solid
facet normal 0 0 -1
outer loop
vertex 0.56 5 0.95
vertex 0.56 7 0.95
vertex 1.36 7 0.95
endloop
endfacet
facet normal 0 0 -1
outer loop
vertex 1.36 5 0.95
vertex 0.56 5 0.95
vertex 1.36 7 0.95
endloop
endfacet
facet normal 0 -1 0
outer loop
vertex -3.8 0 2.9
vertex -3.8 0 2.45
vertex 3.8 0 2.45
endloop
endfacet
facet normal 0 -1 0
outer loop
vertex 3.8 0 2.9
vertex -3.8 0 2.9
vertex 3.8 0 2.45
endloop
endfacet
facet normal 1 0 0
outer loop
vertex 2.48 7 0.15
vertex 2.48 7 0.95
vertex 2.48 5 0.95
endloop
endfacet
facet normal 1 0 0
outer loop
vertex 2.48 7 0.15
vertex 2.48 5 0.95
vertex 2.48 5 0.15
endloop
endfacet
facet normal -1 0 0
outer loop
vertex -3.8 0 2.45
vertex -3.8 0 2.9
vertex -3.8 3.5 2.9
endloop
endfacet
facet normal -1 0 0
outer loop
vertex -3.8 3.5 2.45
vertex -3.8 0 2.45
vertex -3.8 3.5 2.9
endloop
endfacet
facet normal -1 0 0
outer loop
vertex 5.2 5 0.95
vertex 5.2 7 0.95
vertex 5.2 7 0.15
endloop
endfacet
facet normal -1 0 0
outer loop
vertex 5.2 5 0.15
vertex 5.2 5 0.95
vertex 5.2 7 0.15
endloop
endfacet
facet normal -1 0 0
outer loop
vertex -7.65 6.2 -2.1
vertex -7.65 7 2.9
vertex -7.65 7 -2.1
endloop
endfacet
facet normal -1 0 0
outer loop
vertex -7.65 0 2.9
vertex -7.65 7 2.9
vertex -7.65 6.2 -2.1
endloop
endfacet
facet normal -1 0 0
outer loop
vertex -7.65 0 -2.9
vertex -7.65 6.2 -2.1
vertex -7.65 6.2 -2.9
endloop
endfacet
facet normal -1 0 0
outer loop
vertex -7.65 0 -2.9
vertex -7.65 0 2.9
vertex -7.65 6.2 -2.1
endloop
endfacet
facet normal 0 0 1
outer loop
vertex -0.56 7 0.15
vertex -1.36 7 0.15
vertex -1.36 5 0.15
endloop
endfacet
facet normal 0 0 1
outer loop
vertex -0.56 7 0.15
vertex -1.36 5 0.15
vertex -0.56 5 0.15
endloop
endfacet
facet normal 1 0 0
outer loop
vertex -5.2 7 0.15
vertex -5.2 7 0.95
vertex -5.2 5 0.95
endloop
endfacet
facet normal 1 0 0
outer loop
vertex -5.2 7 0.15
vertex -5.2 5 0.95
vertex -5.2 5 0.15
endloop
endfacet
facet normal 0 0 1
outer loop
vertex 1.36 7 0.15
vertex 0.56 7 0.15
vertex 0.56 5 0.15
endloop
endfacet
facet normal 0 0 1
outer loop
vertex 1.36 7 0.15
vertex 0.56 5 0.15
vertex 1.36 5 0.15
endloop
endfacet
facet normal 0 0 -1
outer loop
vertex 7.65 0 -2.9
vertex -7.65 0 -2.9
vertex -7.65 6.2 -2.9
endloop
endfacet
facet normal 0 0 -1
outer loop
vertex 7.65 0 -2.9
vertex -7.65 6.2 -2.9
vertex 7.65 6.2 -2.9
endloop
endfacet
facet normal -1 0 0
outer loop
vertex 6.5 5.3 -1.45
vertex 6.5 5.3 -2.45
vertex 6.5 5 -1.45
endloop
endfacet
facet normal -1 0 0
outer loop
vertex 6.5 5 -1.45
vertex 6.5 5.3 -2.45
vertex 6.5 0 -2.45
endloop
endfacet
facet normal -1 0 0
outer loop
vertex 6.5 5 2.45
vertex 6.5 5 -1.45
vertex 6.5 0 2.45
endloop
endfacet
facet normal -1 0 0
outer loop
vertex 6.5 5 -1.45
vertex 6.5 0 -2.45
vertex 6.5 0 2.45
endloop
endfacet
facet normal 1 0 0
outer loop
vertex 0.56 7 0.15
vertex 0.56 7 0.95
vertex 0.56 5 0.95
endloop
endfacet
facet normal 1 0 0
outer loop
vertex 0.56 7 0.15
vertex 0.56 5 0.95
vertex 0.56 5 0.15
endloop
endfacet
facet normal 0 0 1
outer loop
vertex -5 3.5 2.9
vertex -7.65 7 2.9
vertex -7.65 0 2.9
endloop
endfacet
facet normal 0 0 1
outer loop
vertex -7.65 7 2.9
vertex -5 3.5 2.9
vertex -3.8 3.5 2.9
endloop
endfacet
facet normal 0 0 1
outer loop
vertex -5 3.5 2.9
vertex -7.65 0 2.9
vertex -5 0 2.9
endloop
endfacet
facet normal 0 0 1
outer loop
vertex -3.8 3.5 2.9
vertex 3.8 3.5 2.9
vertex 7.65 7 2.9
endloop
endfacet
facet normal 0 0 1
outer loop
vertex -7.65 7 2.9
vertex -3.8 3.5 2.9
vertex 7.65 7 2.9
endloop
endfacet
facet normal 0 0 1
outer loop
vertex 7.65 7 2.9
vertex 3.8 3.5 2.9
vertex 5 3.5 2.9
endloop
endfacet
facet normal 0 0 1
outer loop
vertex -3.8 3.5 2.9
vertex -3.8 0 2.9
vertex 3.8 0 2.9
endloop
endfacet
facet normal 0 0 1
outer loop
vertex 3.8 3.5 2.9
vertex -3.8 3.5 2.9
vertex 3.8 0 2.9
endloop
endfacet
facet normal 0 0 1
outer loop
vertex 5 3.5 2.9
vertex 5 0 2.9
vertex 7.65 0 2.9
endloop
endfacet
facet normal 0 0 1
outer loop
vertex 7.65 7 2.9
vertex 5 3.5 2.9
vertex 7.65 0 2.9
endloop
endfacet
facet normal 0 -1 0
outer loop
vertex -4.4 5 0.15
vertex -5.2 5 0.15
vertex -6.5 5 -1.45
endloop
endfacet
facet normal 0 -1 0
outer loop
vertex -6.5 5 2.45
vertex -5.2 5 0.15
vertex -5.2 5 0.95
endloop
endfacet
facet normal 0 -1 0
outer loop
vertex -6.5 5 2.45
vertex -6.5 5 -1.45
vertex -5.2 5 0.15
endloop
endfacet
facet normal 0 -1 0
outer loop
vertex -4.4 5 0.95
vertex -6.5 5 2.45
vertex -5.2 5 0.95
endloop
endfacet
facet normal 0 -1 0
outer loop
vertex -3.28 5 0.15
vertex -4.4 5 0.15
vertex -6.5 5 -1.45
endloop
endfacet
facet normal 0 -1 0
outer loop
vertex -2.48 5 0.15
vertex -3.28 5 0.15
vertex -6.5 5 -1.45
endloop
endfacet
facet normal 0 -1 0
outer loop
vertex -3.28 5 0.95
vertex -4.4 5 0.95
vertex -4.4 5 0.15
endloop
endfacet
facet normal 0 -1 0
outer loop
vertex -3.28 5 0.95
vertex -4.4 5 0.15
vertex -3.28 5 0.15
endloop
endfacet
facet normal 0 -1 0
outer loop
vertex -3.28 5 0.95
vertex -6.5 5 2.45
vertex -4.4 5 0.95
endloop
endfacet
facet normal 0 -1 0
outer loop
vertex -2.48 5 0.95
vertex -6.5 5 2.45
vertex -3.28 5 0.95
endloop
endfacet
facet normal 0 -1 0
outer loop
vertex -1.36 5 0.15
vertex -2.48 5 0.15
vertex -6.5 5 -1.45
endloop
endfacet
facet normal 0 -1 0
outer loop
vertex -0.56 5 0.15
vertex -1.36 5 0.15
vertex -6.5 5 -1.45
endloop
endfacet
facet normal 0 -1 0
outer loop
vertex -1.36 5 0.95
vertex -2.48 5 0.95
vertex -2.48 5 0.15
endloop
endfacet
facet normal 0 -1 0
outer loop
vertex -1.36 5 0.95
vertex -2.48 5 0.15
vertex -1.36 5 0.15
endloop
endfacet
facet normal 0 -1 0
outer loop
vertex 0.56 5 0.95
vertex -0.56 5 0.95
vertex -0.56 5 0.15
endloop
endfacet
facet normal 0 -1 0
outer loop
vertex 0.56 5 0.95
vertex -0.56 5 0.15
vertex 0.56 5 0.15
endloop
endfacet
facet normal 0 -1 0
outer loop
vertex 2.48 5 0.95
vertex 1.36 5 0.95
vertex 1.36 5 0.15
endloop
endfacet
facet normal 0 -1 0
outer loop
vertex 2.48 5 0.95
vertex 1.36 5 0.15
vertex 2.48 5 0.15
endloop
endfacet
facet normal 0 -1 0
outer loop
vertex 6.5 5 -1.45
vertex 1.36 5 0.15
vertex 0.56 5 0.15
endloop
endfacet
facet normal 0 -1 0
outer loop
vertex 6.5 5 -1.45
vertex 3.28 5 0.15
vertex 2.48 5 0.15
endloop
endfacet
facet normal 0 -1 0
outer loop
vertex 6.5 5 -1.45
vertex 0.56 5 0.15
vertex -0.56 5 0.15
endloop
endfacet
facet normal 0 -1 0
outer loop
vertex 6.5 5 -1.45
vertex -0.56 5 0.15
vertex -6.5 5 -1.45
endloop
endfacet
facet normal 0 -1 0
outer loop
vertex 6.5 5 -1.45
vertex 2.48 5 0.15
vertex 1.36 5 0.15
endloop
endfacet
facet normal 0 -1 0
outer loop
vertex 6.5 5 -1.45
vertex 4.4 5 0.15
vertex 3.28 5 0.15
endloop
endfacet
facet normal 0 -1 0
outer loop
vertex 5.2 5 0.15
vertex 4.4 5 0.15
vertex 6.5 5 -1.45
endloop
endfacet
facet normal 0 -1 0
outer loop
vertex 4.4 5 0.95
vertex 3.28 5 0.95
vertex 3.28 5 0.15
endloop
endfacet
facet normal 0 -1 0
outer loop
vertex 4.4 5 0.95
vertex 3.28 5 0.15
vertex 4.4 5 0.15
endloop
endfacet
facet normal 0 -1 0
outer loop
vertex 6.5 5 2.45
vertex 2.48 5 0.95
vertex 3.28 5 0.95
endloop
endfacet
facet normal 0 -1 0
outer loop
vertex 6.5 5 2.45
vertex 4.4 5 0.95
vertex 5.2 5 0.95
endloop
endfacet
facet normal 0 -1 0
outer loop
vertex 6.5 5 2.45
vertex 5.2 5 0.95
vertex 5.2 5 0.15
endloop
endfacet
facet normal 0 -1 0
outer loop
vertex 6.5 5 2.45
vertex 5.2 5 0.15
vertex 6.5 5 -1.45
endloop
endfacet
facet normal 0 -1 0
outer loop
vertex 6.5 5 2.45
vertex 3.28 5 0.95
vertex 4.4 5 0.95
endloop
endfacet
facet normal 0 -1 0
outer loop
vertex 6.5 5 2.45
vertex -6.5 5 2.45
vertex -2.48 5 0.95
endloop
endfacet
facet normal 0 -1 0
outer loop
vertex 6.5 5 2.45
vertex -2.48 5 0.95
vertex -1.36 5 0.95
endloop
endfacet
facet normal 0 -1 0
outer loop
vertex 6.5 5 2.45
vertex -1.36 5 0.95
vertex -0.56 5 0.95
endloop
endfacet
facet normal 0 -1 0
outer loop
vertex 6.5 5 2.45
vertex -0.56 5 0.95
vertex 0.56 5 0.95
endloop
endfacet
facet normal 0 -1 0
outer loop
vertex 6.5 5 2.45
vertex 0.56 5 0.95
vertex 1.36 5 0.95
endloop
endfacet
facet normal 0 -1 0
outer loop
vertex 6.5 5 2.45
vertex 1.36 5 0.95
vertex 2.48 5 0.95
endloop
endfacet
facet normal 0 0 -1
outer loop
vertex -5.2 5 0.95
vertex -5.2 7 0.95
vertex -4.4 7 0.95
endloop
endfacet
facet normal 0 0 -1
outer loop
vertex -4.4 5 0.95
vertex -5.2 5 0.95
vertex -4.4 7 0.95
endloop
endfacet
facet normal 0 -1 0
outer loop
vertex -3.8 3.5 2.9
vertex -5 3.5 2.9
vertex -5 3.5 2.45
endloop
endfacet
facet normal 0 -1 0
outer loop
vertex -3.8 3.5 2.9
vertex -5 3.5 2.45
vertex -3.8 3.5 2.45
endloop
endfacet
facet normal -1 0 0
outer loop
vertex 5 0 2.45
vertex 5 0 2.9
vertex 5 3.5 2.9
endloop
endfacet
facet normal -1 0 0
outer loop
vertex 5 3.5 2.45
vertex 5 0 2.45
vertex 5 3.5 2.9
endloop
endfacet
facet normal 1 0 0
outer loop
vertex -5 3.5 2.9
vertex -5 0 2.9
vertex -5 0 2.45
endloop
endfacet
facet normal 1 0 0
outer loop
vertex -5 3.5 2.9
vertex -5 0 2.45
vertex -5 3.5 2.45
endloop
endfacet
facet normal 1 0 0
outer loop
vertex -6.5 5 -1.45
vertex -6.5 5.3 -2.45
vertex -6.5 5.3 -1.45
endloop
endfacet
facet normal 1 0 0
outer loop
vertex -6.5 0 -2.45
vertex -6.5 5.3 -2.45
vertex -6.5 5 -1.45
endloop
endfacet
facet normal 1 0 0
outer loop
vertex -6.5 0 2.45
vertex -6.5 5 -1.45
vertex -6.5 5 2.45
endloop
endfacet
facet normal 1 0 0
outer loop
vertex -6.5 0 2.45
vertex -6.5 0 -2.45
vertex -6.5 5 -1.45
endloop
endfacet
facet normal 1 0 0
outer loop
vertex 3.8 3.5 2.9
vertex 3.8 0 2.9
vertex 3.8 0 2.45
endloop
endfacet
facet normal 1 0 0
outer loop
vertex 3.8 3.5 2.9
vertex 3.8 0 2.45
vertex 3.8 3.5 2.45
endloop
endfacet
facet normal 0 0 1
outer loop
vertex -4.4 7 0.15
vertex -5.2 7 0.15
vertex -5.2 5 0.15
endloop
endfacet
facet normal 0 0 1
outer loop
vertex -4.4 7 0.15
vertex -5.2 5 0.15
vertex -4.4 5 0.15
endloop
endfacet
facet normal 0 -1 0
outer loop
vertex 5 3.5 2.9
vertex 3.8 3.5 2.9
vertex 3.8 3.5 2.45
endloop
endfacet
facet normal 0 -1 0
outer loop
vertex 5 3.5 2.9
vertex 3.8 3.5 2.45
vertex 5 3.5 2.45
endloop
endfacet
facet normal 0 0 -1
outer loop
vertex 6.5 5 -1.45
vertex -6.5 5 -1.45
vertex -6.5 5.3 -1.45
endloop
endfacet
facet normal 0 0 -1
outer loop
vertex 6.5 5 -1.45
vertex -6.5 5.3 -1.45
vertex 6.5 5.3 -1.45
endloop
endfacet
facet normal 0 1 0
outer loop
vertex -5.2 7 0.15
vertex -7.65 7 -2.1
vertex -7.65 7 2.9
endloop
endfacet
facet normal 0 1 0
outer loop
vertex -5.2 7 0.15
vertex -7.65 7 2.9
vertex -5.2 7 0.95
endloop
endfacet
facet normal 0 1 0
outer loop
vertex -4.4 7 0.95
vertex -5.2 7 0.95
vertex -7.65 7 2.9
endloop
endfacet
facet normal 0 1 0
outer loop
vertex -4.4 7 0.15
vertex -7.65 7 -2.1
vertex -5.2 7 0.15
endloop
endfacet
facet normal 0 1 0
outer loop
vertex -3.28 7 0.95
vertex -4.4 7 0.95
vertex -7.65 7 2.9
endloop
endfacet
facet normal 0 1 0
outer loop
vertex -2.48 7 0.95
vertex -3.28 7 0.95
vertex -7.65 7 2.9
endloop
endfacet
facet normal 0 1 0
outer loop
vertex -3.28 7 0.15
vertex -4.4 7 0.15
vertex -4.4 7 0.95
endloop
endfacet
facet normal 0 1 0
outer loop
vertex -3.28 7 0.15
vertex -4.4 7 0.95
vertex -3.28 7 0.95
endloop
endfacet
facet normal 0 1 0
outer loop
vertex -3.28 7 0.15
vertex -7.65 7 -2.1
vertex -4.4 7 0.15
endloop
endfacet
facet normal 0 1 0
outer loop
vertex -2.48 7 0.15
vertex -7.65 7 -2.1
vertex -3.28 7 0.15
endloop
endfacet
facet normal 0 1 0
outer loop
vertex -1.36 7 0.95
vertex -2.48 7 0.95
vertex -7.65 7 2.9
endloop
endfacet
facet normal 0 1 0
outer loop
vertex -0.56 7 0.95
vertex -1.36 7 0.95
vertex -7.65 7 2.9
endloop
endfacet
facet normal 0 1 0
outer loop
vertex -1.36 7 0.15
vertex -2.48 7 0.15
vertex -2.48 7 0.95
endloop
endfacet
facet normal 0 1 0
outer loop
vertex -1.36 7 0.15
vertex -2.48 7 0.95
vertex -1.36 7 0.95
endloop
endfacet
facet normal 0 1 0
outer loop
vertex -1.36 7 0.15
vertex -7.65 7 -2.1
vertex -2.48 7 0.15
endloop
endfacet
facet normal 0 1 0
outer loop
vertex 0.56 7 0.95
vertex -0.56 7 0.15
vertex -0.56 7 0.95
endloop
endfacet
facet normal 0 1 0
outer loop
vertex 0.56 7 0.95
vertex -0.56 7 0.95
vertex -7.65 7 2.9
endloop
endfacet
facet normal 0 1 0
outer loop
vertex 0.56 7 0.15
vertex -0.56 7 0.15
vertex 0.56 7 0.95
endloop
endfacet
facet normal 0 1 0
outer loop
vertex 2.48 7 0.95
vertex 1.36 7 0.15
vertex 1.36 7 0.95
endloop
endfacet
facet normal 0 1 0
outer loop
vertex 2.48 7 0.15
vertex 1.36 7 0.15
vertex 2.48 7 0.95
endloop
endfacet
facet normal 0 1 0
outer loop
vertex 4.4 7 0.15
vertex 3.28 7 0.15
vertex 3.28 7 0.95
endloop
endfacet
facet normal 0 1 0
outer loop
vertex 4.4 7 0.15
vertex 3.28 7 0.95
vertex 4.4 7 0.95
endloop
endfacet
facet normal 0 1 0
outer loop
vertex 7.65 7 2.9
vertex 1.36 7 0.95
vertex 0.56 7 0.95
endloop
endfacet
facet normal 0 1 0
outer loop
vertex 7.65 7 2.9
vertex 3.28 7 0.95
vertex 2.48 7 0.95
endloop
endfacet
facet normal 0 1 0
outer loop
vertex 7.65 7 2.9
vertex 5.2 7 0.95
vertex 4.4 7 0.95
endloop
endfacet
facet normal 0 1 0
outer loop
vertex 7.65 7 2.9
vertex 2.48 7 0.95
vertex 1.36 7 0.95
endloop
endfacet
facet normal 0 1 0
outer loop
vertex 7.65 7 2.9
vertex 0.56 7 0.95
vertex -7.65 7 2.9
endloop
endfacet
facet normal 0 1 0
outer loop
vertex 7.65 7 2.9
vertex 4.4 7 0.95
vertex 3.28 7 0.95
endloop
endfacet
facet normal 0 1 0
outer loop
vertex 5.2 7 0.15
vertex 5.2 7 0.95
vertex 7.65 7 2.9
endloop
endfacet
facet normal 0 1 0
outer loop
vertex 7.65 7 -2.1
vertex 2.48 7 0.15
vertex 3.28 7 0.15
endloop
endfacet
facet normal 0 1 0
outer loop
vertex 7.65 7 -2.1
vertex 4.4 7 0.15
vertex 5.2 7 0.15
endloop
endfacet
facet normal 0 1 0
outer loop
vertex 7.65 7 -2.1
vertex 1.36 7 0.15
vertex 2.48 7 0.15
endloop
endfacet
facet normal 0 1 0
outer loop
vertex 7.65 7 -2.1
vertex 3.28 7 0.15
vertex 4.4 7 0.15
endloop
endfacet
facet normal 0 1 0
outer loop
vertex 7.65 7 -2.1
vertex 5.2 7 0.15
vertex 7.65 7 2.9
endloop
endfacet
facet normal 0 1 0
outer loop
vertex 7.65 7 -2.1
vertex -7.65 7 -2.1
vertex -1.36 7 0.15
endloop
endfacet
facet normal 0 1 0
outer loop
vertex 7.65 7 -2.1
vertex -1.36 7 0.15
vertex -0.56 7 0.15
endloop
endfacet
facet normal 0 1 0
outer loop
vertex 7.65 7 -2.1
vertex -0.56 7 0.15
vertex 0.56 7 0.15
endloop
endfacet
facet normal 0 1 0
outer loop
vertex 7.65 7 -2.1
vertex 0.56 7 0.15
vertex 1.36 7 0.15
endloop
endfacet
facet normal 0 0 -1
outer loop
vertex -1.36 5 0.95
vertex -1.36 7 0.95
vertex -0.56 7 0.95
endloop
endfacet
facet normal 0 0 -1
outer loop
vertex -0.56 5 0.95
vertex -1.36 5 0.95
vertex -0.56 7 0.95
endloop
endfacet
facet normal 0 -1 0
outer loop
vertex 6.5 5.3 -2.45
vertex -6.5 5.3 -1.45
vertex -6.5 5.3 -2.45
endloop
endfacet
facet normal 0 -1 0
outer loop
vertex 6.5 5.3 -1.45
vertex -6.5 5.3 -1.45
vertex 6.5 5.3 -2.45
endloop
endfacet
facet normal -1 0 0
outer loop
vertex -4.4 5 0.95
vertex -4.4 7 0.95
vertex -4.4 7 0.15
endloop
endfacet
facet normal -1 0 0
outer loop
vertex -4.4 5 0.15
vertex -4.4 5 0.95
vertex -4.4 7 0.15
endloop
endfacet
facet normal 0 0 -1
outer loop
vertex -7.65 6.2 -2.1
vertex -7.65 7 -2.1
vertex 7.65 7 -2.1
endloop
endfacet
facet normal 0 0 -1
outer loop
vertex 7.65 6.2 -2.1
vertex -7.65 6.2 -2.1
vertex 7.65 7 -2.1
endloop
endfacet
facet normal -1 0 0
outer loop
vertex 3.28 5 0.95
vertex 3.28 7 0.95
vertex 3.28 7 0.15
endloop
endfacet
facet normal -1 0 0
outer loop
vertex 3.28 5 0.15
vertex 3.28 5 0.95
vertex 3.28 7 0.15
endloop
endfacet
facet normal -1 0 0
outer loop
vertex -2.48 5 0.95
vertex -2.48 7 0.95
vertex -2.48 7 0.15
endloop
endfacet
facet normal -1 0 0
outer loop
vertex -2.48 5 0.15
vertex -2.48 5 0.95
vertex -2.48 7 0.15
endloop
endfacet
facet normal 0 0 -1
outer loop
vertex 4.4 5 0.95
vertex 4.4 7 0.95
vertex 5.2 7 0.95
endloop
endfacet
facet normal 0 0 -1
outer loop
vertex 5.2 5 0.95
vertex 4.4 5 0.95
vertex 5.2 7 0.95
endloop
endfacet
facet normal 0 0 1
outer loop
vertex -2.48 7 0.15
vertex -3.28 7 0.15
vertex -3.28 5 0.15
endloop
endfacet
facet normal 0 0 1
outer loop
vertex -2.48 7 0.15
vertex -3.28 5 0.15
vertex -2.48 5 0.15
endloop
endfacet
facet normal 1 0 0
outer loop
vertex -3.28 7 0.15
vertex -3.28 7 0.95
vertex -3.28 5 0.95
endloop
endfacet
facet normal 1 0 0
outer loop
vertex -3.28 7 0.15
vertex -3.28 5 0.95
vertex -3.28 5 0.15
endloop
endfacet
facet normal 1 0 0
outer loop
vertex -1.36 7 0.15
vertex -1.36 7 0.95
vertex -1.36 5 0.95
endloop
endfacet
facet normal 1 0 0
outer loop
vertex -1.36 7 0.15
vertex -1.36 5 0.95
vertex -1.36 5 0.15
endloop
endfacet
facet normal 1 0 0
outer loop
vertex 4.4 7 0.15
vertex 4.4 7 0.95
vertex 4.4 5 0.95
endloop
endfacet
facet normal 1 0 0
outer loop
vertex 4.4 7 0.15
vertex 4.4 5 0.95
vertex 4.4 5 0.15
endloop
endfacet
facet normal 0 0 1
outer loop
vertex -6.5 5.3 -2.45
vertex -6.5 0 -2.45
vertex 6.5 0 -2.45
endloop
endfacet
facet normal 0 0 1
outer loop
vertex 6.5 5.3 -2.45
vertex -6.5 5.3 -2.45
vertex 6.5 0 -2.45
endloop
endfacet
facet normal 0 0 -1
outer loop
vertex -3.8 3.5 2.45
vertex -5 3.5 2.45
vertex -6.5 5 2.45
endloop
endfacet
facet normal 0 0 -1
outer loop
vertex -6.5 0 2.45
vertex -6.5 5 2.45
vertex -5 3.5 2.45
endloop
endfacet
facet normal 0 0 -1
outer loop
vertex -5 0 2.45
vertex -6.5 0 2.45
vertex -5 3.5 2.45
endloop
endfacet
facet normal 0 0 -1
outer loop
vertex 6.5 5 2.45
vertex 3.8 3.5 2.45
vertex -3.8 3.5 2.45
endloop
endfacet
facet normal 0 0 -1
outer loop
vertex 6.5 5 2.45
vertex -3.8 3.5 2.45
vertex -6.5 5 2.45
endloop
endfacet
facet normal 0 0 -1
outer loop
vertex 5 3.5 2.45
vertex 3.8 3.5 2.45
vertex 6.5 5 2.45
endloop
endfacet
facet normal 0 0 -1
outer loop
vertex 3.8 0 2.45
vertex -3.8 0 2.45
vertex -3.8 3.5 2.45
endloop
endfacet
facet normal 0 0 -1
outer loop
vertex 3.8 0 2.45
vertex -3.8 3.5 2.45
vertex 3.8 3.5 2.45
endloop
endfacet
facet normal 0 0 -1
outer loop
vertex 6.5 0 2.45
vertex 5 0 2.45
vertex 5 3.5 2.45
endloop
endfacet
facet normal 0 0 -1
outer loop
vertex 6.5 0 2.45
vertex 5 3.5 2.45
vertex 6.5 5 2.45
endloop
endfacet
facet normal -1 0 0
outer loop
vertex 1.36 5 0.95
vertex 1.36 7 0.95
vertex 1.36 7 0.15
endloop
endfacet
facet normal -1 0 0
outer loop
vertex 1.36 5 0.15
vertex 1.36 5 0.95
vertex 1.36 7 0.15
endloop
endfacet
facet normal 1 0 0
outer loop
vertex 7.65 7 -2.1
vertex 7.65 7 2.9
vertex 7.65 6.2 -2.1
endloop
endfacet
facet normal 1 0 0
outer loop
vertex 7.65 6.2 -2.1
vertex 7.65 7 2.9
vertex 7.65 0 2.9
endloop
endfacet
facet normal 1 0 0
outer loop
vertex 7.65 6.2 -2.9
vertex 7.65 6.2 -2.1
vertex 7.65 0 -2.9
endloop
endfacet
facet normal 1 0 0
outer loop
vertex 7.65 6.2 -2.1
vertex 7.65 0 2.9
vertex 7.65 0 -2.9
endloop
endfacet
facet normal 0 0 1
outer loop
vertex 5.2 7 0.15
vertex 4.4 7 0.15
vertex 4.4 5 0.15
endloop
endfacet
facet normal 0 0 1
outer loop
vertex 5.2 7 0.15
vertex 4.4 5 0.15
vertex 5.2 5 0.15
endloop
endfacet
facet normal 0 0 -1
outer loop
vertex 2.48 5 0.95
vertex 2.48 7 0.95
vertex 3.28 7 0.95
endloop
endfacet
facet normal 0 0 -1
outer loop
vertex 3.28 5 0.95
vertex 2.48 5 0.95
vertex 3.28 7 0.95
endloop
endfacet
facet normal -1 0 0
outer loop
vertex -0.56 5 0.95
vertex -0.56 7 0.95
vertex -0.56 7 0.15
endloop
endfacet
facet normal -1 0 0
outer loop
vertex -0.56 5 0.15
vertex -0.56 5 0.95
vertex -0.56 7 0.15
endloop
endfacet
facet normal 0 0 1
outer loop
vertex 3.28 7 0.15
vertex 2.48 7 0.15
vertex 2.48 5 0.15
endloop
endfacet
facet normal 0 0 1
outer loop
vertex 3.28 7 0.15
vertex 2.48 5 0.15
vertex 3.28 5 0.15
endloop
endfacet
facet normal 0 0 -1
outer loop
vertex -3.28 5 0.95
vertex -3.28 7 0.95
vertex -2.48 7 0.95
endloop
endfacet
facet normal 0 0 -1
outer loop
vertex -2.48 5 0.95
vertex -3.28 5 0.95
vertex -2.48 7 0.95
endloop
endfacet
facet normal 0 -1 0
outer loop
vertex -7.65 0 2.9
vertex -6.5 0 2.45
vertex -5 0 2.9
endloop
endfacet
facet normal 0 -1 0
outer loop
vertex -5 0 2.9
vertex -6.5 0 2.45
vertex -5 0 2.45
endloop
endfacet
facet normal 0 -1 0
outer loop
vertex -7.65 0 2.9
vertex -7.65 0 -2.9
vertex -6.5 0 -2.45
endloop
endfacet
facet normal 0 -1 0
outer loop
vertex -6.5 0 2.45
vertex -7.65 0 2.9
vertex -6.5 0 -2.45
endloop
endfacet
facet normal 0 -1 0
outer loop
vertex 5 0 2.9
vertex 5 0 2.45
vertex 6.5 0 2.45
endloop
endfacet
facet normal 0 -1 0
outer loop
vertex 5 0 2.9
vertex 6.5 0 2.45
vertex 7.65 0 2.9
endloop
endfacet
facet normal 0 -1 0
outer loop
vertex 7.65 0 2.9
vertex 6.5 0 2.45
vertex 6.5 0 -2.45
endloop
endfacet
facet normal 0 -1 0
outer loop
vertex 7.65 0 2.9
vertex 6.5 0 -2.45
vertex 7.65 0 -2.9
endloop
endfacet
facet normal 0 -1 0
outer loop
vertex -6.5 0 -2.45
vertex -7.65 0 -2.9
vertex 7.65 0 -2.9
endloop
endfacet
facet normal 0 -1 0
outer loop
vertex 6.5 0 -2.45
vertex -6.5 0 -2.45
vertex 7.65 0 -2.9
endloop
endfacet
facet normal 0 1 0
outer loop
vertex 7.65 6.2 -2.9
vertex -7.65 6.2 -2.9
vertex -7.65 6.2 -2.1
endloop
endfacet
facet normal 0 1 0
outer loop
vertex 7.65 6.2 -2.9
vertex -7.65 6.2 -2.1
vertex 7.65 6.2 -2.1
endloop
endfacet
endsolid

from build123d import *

# Parameters (mm, degrees)
SKETCH1_W           = 15.3
SKETCH1_H           = 5.8
BOSS_EXTRUDE1_DEPTH = 7
SKETCH3_W           = 13
SKETCH3_H           = 4.9
CUT_EXTRUDE1_DEPTH  = 5
SKETCH4_W           = 1.2
SKETCH4_H           = 3.5
CUT_EXTRUDE2_DEPTH  = 4
SKETCH5_W           = 15.3
SKETCH5_H           = 0.8
CUT_EXTRUDE3_DEPTH  = 0.8
SKETCH6_W           = 0.8
SKETCH6_H           = 0.8
CUT_EXTRUDE4_DEPTH  = 10
SKETCH7_W           = 13
SKETCH7_H           = 1
CUT_EXTRUDE5_DEPTH  = 0.3


with BuildPart() as part:
    # Sketch1 → Boss-Extrude1 (new body)
    with BuildSketch(Plane(origin=(0, 0, 0), x_dir=(1, 0, 0), z_dir=(0, 1, 0))):
        Rectangle(SKETCH1_W, SKETCH1_H)
    extrude(amount=BOSS_EXTRUDE1_DEPTH)

    # Sketch3 → Cut-Extrude1 (cut)
    with BuildSketch(Plane.XZ):
        Rectangle(SKETCH3_W, SKETCH3_H)
    extrude(amount=-CUT_EXTRUDE1_DEPTH, mode=Mode.SUBTRACT)

    # Sketch4 → Cut-Extrude2 (cut)
    with BuildSketch(Plane.XY.offset(2.9)):
        with Locations((-4.4, 1.75)):
            Rectangle(SKETCH4_W, SKETCH4_H)
        with Locations((4.4, 1.75)):
            Rectangle(SKETCH4_W, SKETCH4_H)
    extrude(amount=-CUT_EXTRUDE2_DEPTH, mode=Mode.SUBTRACT)

    # Sketch5 → Cut-Extrude3 (cut)
    with BuildSketch(Plane(origin=(0, 7, 0), x_dir=(1, 0, 0), z_dir=(0, 1, 0))):
        with Locations((0, 2.5)):
            Rectangle(SKETCH5_W, SKETCH5_H)
    extrude(amount=-CUT_EXTRUDE3_DEPTH, mode=Mode.SUBTRACT)

    # Sketch6 → Cut-Extrude4 (cut)
    with BuildSketch(Plane(origin=(0, 7, 0), x_dir=(1, 0, 0), z_dir=(0, 1, 0))):
        with Locations((4.8, -0.55)):
            Rectangle(SKETCH6_W, SKETCH6_H)
        with Locations((2.88, -0.55)):
            Rectangle(SKETCH6_W, SKETCH6_H)
        with Locations((0.96, -0.55)):
            Rectangle(SKETCH6_W, SKETCH6_H)
        with Locations((-0.96, -0.55)):
            Rectangle(SKETCH6_W, SKETCH6_H)
        with Locations((-2.88, -0.55)):
            Rectangle(SKETCH6_W, SKETCH6_H)
        with Locations((-4.8, -0.55)):
            Rectangle(SKETCH6_W, SKETCH6_H)
    extrude(amount=-CUT_EXTRUDE4_DEPTH, mode=Mode.SUBTRACT)

    # Sketch7 → Cut-Extrude5 (cut)
    with BuildSketch(Plane.XZ.offset(-5)):
        with Locations((0, -1.95)):
            Rectangle(SKETCH7_W, SKETCH7_H)
    extrude(amount=-CUT_EXTRUDE5_DEPTH, mode=Mode.SUBTRACT)


solid = part.part
